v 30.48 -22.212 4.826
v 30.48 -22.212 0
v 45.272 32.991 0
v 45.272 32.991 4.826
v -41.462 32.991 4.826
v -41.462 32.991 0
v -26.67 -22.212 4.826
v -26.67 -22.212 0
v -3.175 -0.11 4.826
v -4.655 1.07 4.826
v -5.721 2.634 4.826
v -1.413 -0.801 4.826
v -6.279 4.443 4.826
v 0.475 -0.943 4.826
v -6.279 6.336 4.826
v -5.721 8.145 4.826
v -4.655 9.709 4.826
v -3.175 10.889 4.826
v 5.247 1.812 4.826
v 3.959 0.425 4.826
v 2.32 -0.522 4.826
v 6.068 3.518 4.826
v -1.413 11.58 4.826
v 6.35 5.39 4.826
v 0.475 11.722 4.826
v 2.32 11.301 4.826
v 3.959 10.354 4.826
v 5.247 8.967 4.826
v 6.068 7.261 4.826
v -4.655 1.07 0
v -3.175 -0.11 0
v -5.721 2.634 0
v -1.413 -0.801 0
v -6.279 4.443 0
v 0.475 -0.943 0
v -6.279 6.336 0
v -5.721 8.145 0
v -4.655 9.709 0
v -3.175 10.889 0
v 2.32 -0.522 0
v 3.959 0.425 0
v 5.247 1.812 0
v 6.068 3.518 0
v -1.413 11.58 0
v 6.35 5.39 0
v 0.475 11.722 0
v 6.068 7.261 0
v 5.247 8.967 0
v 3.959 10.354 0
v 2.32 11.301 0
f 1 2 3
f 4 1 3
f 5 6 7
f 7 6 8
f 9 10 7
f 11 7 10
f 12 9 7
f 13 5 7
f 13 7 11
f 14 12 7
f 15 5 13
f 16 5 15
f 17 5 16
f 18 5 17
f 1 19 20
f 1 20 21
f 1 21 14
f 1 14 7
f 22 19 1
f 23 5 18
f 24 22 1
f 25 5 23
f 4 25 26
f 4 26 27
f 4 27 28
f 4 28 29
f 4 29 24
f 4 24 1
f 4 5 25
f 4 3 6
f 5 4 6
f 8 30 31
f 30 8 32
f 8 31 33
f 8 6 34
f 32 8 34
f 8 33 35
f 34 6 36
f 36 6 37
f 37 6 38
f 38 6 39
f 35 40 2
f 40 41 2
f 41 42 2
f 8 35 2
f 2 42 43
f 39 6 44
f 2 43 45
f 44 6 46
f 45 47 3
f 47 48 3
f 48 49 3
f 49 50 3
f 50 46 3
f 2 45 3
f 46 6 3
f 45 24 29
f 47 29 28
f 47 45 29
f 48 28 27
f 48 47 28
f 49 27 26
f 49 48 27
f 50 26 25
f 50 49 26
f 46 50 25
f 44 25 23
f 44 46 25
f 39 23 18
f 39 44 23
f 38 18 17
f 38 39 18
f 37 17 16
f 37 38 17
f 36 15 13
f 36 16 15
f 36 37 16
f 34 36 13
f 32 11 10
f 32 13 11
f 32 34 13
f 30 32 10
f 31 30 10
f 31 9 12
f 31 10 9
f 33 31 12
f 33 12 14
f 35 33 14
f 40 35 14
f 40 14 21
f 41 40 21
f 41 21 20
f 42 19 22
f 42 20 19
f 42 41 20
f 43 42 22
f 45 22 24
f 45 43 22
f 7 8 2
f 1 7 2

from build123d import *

# Parameters (mm, degrees)
BOSS_EXTRUDE1_DEPTH = 4.826
SKETCH4_R           = 6.35
CUT_EXTRUDE5_DEPTH  = 5.826


with BuildPart() as part:
    # Sketch1 → Boss-Extrude1 (new body)
    with BuildSketch(Plane.XY):
        Polygon((-26.67, -22.21179672), (30.48, -22.21179672), (45.271508428, 32.990864252), (-41.461508428, 32.990864252), align=None)
    extrude(amount=BOSS_EXTRUDE1_DEPTH)

    # Sketch4 → Cut-Extrude5 (cut, through all)
    with BuildSketch(Plane.XY):
        with Locations((0, 5.389533766)):
            Circle(SKETCH4_R)
    extrude(amount=CUT_EXTRUDE5_DEPTH, mode=Mode.SUBTRACT)


solid = part.part
